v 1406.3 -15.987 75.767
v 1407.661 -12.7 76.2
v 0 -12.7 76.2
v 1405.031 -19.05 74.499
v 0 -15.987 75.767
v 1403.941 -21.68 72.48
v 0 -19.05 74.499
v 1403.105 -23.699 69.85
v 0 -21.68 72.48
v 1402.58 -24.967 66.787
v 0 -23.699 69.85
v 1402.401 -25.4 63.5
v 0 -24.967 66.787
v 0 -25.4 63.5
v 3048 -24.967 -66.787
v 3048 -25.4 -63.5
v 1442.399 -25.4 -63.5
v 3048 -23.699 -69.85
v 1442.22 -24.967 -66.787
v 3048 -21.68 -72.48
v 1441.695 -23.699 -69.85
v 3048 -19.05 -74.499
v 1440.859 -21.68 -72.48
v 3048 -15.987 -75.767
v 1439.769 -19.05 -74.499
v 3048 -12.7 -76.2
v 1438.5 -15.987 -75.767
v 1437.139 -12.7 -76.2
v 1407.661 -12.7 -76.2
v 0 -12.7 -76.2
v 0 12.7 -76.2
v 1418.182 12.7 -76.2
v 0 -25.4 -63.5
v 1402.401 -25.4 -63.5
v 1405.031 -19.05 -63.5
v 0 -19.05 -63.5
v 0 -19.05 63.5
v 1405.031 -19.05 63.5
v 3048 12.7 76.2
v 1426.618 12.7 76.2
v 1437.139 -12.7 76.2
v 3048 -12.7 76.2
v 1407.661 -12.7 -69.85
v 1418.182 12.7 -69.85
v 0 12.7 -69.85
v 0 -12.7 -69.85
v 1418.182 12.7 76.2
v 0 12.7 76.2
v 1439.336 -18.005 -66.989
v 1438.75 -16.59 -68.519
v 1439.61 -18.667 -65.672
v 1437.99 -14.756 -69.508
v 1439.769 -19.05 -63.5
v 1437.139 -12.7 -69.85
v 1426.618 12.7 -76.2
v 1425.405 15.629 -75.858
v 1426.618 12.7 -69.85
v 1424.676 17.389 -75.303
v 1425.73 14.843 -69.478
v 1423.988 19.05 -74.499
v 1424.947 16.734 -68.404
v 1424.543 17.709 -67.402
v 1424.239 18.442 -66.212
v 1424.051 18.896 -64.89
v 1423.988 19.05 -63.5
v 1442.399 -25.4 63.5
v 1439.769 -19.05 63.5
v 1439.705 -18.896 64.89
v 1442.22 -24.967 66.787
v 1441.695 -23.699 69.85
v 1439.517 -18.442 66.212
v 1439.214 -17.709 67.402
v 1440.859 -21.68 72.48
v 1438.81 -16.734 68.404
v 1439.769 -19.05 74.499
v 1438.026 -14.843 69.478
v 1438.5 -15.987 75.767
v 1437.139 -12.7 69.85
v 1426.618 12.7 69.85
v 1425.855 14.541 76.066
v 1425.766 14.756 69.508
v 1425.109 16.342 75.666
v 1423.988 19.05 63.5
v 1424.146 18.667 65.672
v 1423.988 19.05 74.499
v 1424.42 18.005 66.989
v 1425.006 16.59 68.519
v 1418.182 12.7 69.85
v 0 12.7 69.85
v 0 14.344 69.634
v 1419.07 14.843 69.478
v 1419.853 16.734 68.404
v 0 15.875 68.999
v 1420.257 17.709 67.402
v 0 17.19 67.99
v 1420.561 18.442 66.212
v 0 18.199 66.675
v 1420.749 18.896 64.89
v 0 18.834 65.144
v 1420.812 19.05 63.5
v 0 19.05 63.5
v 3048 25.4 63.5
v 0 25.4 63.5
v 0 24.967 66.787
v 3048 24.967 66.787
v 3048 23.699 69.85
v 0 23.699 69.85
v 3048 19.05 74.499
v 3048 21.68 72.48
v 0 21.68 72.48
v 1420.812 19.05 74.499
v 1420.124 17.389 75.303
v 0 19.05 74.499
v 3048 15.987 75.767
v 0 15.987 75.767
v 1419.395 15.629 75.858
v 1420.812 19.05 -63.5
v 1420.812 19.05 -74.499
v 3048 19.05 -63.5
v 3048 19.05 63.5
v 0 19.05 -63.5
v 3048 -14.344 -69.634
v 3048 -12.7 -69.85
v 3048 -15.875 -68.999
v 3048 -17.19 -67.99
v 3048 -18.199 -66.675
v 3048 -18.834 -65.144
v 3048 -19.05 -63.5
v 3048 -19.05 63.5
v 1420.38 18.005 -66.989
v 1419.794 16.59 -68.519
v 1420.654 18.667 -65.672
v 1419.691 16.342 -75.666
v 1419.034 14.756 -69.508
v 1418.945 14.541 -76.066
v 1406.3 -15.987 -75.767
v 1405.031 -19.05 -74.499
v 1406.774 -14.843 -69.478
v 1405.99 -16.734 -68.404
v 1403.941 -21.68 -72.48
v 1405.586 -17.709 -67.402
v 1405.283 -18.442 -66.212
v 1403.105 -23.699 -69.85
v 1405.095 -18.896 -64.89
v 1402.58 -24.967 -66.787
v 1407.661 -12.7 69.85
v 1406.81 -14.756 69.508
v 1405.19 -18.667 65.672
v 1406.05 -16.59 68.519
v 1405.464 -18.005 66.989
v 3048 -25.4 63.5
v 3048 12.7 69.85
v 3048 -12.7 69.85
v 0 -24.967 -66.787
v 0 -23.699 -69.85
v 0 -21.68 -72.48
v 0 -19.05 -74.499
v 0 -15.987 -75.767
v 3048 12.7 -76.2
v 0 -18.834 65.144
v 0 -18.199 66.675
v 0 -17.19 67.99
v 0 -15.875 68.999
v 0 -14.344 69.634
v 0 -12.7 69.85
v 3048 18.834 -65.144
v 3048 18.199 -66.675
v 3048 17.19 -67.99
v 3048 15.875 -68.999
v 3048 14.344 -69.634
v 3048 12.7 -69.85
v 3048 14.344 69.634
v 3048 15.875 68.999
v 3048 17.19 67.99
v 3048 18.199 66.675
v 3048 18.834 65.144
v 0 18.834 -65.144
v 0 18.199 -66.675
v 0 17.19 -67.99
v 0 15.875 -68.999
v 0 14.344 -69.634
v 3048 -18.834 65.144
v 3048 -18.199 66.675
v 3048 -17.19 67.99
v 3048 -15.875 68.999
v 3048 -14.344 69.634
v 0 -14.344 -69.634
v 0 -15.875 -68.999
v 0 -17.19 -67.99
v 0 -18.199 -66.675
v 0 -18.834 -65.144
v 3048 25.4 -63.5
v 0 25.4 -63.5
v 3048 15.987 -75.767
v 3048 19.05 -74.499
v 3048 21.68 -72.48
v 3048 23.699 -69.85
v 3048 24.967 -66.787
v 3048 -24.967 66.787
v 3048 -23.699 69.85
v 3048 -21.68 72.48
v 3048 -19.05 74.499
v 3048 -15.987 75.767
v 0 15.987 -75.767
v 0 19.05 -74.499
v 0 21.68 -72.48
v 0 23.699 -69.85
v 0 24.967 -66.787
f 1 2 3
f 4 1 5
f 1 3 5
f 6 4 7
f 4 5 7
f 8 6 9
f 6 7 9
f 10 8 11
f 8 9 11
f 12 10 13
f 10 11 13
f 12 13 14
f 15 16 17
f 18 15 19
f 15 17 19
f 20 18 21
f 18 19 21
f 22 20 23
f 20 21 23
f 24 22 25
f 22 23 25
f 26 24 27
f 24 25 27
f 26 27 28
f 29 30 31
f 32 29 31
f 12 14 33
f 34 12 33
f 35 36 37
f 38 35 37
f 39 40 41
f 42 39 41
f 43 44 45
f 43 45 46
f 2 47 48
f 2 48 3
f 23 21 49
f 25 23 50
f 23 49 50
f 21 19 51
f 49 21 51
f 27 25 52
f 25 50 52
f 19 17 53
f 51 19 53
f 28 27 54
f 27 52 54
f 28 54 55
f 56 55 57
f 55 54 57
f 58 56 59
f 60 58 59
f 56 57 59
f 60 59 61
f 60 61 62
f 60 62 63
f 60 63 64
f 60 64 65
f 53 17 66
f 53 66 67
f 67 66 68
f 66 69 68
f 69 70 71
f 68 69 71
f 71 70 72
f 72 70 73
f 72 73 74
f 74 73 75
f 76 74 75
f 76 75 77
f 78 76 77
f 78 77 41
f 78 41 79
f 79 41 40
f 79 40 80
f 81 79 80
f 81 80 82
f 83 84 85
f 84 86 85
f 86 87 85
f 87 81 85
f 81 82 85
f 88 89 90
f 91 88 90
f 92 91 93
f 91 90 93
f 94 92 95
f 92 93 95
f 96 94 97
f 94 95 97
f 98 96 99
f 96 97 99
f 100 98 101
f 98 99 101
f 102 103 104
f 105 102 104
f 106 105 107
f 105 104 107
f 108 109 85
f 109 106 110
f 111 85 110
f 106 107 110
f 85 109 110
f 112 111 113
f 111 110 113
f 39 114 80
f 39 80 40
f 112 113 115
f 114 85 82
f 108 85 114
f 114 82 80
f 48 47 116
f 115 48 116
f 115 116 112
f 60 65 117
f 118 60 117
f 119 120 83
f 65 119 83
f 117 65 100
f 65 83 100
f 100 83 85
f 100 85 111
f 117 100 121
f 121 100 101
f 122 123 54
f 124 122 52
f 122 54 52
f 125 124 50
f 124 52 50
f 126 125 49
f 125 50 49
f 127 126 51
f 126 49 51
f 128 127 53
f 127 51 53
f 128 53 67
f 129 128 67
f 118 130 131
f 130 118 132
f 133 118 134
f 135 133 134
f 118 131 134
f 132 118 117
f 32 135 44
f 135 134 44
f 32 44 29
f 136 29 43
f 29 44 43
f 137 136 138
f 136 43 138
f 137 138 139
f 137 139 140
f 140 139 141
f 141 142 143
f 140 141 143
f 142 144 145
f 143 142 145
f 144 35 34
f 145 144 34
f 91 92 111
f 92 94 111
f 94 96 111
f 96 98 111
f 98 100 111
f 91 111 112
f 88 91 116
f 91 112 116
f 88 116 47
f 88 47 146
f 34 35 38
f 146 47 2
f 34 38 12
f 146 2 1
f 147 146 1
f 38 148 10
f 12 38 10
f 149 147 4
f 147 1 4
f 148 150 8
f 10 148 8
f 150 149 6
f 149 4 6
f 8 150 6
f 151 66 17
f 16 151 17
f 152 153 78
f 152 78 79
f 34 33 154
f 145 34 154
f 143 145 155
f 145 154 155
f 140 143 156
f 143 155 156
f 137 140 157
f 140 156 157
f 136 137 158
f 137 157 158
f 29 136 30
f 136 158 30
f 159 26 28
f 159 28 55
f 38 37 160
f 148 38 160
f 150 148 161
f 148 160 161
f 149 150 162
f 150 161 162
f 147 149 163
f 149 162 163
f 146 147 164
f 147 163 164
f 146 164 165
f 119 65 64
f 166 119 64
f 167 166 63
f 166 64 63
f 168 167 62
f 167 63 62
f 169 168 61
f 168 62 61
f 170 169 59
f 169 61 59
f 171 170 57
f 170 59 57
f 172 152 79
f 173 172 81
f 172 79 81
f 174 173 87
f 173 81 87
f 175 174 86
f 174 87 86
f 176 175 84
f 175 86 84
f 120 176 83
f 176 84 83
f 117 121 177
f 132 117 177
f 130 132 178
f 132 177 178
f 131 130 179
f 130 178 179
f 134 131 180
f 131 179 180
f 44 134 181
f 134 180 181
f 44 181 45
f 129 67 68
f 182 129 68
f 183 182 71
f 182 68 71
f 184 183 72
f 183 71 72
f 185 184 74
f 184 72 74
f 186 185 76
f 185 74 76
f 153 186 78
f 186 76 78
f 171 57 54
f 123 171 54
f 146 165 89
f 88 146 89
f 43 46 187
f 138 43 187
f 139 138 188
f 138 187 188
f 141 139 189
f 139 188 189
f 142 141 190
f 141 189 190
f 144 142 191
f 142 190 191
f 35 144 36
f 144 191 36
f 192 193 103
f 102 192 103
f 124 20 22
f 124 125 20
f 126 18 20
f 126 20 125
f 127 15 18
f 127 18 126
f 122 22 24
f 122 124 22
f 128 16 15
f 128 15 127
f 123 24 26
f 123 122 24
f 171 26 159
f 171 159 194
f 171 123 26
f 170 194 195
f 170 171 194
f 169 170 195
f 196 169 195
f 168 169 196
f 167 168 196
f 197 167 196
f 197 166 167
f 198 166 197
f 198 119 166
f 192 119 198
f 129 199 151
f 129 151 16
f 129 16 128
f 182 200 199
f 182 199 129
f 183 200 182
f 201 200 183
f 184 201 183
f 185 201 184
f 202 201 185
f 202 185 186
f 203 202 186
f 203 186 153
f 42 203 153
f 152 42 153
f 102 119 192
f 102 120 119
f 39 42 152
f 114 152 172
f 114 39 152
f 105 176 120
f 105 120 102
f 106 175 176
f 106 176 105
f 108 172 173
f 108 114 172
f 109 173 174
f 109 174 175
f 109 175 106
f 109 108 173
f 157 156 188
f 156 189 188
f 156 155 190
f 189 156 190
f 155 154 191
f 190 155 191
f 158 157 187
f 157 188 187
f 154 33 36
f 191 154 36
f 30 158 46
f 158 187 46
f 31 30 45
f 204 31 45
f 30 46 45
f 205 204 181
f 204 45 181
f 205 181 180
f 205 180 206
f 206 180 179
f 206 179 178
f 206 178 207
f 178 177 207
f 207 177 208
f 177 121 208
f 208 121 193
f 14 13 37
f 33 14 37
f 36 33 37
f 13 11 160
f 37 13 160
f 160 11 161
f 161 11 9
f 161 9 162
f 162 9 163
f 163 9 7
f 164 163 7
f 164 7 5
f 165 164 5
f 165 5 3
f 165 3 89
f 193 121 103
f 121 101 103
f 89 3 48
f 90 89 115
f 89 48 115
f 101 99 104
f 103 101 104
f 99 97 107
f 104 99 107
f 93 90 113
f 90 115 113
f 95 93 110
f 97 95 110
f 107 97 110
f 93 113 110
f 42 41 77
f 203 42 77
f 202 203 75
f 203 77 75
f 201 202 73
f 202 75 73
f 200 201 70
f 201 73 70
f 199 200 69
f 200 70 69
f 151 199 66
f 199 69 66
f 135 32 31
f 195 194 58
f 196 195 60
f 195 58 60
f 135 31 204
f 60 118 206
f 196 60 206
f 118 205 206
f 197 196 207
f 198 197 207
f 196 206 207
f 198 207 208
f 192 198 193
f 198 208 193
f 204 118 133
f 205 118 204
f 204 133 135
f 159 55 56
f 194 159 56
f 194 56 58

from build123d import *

# Parameters (mm, degrees)
F1_DEPTH = 3048
F3_DEPTH = 152.401


with BuildPart() as f1:
    # F0 (on Right) → F1 (new body)
    with BuildSketch(Plane.YZ):
        with BuildLine():
            ThreePointArc((25.4, 63.5), (21.680256, 72.480256), (12.7, 76.2))
            Line((12.7, 76.2), (-12.7, 76.2))
            ThreePointArc((-12.7, 76.2), (-21.680256, 72.480256), (-25.4, 63.5))
            Line((-25.4, 63.5), (-25.4, -63.5))
            ThreePointArc((-25.4, -63.5), (-21.680256, -72.480256), (-12.7, -76.2))
            Line((-12.7, -76.2), (12.7, -76.2))
            ThreePointArc((12.7, -76.2), (21.680256, -72.480256), (25.4, -63.5))
            Line((25.4, -63.5), (25.4, 63.5))
        make_face()
        with BuildLine():
            Line((-19.05, -63.5), (-19.05, 63.5))
            ThreePointArc((-19.05, 63.5), (-17.190128, 67.990128), (-12.7, 69.85))
            Line((-12.7, 69.85), (12.7, 69.85))
            ThreePointArc((12.7, 69.85), (17.190128, 67.990128), (19.05, 63.5))
            Line((19.05, 63.5), (19.05, -63.5))
            ThreePointArc((19.05, -63.5), (17.190128, -67.990128), (12.7, -69.85))
            Line((12.7, -69.85), (-12.7, -69.85))
            ThreePointArc((-12.7, -69.85), (-17.190128, -67.990128), (-19.05, -63.5))
        make_face(mode=Mode.SUBTRACT)
    extrude(amount=F1_DEPTH)

    # F2 (on face) → F3 (cut, through all)
    with BuildSketch(Plane.XY.offset(76.2)):
        Polygon((1423.9875, 19.05), (1420.8125, 19.05), (1402.400707, -25.4), (1442.399293, -25.4), align=None)
    extrude(amount=-F3_DEPTH, mode=Mode.SUBTRACT)


solid = f1.part
